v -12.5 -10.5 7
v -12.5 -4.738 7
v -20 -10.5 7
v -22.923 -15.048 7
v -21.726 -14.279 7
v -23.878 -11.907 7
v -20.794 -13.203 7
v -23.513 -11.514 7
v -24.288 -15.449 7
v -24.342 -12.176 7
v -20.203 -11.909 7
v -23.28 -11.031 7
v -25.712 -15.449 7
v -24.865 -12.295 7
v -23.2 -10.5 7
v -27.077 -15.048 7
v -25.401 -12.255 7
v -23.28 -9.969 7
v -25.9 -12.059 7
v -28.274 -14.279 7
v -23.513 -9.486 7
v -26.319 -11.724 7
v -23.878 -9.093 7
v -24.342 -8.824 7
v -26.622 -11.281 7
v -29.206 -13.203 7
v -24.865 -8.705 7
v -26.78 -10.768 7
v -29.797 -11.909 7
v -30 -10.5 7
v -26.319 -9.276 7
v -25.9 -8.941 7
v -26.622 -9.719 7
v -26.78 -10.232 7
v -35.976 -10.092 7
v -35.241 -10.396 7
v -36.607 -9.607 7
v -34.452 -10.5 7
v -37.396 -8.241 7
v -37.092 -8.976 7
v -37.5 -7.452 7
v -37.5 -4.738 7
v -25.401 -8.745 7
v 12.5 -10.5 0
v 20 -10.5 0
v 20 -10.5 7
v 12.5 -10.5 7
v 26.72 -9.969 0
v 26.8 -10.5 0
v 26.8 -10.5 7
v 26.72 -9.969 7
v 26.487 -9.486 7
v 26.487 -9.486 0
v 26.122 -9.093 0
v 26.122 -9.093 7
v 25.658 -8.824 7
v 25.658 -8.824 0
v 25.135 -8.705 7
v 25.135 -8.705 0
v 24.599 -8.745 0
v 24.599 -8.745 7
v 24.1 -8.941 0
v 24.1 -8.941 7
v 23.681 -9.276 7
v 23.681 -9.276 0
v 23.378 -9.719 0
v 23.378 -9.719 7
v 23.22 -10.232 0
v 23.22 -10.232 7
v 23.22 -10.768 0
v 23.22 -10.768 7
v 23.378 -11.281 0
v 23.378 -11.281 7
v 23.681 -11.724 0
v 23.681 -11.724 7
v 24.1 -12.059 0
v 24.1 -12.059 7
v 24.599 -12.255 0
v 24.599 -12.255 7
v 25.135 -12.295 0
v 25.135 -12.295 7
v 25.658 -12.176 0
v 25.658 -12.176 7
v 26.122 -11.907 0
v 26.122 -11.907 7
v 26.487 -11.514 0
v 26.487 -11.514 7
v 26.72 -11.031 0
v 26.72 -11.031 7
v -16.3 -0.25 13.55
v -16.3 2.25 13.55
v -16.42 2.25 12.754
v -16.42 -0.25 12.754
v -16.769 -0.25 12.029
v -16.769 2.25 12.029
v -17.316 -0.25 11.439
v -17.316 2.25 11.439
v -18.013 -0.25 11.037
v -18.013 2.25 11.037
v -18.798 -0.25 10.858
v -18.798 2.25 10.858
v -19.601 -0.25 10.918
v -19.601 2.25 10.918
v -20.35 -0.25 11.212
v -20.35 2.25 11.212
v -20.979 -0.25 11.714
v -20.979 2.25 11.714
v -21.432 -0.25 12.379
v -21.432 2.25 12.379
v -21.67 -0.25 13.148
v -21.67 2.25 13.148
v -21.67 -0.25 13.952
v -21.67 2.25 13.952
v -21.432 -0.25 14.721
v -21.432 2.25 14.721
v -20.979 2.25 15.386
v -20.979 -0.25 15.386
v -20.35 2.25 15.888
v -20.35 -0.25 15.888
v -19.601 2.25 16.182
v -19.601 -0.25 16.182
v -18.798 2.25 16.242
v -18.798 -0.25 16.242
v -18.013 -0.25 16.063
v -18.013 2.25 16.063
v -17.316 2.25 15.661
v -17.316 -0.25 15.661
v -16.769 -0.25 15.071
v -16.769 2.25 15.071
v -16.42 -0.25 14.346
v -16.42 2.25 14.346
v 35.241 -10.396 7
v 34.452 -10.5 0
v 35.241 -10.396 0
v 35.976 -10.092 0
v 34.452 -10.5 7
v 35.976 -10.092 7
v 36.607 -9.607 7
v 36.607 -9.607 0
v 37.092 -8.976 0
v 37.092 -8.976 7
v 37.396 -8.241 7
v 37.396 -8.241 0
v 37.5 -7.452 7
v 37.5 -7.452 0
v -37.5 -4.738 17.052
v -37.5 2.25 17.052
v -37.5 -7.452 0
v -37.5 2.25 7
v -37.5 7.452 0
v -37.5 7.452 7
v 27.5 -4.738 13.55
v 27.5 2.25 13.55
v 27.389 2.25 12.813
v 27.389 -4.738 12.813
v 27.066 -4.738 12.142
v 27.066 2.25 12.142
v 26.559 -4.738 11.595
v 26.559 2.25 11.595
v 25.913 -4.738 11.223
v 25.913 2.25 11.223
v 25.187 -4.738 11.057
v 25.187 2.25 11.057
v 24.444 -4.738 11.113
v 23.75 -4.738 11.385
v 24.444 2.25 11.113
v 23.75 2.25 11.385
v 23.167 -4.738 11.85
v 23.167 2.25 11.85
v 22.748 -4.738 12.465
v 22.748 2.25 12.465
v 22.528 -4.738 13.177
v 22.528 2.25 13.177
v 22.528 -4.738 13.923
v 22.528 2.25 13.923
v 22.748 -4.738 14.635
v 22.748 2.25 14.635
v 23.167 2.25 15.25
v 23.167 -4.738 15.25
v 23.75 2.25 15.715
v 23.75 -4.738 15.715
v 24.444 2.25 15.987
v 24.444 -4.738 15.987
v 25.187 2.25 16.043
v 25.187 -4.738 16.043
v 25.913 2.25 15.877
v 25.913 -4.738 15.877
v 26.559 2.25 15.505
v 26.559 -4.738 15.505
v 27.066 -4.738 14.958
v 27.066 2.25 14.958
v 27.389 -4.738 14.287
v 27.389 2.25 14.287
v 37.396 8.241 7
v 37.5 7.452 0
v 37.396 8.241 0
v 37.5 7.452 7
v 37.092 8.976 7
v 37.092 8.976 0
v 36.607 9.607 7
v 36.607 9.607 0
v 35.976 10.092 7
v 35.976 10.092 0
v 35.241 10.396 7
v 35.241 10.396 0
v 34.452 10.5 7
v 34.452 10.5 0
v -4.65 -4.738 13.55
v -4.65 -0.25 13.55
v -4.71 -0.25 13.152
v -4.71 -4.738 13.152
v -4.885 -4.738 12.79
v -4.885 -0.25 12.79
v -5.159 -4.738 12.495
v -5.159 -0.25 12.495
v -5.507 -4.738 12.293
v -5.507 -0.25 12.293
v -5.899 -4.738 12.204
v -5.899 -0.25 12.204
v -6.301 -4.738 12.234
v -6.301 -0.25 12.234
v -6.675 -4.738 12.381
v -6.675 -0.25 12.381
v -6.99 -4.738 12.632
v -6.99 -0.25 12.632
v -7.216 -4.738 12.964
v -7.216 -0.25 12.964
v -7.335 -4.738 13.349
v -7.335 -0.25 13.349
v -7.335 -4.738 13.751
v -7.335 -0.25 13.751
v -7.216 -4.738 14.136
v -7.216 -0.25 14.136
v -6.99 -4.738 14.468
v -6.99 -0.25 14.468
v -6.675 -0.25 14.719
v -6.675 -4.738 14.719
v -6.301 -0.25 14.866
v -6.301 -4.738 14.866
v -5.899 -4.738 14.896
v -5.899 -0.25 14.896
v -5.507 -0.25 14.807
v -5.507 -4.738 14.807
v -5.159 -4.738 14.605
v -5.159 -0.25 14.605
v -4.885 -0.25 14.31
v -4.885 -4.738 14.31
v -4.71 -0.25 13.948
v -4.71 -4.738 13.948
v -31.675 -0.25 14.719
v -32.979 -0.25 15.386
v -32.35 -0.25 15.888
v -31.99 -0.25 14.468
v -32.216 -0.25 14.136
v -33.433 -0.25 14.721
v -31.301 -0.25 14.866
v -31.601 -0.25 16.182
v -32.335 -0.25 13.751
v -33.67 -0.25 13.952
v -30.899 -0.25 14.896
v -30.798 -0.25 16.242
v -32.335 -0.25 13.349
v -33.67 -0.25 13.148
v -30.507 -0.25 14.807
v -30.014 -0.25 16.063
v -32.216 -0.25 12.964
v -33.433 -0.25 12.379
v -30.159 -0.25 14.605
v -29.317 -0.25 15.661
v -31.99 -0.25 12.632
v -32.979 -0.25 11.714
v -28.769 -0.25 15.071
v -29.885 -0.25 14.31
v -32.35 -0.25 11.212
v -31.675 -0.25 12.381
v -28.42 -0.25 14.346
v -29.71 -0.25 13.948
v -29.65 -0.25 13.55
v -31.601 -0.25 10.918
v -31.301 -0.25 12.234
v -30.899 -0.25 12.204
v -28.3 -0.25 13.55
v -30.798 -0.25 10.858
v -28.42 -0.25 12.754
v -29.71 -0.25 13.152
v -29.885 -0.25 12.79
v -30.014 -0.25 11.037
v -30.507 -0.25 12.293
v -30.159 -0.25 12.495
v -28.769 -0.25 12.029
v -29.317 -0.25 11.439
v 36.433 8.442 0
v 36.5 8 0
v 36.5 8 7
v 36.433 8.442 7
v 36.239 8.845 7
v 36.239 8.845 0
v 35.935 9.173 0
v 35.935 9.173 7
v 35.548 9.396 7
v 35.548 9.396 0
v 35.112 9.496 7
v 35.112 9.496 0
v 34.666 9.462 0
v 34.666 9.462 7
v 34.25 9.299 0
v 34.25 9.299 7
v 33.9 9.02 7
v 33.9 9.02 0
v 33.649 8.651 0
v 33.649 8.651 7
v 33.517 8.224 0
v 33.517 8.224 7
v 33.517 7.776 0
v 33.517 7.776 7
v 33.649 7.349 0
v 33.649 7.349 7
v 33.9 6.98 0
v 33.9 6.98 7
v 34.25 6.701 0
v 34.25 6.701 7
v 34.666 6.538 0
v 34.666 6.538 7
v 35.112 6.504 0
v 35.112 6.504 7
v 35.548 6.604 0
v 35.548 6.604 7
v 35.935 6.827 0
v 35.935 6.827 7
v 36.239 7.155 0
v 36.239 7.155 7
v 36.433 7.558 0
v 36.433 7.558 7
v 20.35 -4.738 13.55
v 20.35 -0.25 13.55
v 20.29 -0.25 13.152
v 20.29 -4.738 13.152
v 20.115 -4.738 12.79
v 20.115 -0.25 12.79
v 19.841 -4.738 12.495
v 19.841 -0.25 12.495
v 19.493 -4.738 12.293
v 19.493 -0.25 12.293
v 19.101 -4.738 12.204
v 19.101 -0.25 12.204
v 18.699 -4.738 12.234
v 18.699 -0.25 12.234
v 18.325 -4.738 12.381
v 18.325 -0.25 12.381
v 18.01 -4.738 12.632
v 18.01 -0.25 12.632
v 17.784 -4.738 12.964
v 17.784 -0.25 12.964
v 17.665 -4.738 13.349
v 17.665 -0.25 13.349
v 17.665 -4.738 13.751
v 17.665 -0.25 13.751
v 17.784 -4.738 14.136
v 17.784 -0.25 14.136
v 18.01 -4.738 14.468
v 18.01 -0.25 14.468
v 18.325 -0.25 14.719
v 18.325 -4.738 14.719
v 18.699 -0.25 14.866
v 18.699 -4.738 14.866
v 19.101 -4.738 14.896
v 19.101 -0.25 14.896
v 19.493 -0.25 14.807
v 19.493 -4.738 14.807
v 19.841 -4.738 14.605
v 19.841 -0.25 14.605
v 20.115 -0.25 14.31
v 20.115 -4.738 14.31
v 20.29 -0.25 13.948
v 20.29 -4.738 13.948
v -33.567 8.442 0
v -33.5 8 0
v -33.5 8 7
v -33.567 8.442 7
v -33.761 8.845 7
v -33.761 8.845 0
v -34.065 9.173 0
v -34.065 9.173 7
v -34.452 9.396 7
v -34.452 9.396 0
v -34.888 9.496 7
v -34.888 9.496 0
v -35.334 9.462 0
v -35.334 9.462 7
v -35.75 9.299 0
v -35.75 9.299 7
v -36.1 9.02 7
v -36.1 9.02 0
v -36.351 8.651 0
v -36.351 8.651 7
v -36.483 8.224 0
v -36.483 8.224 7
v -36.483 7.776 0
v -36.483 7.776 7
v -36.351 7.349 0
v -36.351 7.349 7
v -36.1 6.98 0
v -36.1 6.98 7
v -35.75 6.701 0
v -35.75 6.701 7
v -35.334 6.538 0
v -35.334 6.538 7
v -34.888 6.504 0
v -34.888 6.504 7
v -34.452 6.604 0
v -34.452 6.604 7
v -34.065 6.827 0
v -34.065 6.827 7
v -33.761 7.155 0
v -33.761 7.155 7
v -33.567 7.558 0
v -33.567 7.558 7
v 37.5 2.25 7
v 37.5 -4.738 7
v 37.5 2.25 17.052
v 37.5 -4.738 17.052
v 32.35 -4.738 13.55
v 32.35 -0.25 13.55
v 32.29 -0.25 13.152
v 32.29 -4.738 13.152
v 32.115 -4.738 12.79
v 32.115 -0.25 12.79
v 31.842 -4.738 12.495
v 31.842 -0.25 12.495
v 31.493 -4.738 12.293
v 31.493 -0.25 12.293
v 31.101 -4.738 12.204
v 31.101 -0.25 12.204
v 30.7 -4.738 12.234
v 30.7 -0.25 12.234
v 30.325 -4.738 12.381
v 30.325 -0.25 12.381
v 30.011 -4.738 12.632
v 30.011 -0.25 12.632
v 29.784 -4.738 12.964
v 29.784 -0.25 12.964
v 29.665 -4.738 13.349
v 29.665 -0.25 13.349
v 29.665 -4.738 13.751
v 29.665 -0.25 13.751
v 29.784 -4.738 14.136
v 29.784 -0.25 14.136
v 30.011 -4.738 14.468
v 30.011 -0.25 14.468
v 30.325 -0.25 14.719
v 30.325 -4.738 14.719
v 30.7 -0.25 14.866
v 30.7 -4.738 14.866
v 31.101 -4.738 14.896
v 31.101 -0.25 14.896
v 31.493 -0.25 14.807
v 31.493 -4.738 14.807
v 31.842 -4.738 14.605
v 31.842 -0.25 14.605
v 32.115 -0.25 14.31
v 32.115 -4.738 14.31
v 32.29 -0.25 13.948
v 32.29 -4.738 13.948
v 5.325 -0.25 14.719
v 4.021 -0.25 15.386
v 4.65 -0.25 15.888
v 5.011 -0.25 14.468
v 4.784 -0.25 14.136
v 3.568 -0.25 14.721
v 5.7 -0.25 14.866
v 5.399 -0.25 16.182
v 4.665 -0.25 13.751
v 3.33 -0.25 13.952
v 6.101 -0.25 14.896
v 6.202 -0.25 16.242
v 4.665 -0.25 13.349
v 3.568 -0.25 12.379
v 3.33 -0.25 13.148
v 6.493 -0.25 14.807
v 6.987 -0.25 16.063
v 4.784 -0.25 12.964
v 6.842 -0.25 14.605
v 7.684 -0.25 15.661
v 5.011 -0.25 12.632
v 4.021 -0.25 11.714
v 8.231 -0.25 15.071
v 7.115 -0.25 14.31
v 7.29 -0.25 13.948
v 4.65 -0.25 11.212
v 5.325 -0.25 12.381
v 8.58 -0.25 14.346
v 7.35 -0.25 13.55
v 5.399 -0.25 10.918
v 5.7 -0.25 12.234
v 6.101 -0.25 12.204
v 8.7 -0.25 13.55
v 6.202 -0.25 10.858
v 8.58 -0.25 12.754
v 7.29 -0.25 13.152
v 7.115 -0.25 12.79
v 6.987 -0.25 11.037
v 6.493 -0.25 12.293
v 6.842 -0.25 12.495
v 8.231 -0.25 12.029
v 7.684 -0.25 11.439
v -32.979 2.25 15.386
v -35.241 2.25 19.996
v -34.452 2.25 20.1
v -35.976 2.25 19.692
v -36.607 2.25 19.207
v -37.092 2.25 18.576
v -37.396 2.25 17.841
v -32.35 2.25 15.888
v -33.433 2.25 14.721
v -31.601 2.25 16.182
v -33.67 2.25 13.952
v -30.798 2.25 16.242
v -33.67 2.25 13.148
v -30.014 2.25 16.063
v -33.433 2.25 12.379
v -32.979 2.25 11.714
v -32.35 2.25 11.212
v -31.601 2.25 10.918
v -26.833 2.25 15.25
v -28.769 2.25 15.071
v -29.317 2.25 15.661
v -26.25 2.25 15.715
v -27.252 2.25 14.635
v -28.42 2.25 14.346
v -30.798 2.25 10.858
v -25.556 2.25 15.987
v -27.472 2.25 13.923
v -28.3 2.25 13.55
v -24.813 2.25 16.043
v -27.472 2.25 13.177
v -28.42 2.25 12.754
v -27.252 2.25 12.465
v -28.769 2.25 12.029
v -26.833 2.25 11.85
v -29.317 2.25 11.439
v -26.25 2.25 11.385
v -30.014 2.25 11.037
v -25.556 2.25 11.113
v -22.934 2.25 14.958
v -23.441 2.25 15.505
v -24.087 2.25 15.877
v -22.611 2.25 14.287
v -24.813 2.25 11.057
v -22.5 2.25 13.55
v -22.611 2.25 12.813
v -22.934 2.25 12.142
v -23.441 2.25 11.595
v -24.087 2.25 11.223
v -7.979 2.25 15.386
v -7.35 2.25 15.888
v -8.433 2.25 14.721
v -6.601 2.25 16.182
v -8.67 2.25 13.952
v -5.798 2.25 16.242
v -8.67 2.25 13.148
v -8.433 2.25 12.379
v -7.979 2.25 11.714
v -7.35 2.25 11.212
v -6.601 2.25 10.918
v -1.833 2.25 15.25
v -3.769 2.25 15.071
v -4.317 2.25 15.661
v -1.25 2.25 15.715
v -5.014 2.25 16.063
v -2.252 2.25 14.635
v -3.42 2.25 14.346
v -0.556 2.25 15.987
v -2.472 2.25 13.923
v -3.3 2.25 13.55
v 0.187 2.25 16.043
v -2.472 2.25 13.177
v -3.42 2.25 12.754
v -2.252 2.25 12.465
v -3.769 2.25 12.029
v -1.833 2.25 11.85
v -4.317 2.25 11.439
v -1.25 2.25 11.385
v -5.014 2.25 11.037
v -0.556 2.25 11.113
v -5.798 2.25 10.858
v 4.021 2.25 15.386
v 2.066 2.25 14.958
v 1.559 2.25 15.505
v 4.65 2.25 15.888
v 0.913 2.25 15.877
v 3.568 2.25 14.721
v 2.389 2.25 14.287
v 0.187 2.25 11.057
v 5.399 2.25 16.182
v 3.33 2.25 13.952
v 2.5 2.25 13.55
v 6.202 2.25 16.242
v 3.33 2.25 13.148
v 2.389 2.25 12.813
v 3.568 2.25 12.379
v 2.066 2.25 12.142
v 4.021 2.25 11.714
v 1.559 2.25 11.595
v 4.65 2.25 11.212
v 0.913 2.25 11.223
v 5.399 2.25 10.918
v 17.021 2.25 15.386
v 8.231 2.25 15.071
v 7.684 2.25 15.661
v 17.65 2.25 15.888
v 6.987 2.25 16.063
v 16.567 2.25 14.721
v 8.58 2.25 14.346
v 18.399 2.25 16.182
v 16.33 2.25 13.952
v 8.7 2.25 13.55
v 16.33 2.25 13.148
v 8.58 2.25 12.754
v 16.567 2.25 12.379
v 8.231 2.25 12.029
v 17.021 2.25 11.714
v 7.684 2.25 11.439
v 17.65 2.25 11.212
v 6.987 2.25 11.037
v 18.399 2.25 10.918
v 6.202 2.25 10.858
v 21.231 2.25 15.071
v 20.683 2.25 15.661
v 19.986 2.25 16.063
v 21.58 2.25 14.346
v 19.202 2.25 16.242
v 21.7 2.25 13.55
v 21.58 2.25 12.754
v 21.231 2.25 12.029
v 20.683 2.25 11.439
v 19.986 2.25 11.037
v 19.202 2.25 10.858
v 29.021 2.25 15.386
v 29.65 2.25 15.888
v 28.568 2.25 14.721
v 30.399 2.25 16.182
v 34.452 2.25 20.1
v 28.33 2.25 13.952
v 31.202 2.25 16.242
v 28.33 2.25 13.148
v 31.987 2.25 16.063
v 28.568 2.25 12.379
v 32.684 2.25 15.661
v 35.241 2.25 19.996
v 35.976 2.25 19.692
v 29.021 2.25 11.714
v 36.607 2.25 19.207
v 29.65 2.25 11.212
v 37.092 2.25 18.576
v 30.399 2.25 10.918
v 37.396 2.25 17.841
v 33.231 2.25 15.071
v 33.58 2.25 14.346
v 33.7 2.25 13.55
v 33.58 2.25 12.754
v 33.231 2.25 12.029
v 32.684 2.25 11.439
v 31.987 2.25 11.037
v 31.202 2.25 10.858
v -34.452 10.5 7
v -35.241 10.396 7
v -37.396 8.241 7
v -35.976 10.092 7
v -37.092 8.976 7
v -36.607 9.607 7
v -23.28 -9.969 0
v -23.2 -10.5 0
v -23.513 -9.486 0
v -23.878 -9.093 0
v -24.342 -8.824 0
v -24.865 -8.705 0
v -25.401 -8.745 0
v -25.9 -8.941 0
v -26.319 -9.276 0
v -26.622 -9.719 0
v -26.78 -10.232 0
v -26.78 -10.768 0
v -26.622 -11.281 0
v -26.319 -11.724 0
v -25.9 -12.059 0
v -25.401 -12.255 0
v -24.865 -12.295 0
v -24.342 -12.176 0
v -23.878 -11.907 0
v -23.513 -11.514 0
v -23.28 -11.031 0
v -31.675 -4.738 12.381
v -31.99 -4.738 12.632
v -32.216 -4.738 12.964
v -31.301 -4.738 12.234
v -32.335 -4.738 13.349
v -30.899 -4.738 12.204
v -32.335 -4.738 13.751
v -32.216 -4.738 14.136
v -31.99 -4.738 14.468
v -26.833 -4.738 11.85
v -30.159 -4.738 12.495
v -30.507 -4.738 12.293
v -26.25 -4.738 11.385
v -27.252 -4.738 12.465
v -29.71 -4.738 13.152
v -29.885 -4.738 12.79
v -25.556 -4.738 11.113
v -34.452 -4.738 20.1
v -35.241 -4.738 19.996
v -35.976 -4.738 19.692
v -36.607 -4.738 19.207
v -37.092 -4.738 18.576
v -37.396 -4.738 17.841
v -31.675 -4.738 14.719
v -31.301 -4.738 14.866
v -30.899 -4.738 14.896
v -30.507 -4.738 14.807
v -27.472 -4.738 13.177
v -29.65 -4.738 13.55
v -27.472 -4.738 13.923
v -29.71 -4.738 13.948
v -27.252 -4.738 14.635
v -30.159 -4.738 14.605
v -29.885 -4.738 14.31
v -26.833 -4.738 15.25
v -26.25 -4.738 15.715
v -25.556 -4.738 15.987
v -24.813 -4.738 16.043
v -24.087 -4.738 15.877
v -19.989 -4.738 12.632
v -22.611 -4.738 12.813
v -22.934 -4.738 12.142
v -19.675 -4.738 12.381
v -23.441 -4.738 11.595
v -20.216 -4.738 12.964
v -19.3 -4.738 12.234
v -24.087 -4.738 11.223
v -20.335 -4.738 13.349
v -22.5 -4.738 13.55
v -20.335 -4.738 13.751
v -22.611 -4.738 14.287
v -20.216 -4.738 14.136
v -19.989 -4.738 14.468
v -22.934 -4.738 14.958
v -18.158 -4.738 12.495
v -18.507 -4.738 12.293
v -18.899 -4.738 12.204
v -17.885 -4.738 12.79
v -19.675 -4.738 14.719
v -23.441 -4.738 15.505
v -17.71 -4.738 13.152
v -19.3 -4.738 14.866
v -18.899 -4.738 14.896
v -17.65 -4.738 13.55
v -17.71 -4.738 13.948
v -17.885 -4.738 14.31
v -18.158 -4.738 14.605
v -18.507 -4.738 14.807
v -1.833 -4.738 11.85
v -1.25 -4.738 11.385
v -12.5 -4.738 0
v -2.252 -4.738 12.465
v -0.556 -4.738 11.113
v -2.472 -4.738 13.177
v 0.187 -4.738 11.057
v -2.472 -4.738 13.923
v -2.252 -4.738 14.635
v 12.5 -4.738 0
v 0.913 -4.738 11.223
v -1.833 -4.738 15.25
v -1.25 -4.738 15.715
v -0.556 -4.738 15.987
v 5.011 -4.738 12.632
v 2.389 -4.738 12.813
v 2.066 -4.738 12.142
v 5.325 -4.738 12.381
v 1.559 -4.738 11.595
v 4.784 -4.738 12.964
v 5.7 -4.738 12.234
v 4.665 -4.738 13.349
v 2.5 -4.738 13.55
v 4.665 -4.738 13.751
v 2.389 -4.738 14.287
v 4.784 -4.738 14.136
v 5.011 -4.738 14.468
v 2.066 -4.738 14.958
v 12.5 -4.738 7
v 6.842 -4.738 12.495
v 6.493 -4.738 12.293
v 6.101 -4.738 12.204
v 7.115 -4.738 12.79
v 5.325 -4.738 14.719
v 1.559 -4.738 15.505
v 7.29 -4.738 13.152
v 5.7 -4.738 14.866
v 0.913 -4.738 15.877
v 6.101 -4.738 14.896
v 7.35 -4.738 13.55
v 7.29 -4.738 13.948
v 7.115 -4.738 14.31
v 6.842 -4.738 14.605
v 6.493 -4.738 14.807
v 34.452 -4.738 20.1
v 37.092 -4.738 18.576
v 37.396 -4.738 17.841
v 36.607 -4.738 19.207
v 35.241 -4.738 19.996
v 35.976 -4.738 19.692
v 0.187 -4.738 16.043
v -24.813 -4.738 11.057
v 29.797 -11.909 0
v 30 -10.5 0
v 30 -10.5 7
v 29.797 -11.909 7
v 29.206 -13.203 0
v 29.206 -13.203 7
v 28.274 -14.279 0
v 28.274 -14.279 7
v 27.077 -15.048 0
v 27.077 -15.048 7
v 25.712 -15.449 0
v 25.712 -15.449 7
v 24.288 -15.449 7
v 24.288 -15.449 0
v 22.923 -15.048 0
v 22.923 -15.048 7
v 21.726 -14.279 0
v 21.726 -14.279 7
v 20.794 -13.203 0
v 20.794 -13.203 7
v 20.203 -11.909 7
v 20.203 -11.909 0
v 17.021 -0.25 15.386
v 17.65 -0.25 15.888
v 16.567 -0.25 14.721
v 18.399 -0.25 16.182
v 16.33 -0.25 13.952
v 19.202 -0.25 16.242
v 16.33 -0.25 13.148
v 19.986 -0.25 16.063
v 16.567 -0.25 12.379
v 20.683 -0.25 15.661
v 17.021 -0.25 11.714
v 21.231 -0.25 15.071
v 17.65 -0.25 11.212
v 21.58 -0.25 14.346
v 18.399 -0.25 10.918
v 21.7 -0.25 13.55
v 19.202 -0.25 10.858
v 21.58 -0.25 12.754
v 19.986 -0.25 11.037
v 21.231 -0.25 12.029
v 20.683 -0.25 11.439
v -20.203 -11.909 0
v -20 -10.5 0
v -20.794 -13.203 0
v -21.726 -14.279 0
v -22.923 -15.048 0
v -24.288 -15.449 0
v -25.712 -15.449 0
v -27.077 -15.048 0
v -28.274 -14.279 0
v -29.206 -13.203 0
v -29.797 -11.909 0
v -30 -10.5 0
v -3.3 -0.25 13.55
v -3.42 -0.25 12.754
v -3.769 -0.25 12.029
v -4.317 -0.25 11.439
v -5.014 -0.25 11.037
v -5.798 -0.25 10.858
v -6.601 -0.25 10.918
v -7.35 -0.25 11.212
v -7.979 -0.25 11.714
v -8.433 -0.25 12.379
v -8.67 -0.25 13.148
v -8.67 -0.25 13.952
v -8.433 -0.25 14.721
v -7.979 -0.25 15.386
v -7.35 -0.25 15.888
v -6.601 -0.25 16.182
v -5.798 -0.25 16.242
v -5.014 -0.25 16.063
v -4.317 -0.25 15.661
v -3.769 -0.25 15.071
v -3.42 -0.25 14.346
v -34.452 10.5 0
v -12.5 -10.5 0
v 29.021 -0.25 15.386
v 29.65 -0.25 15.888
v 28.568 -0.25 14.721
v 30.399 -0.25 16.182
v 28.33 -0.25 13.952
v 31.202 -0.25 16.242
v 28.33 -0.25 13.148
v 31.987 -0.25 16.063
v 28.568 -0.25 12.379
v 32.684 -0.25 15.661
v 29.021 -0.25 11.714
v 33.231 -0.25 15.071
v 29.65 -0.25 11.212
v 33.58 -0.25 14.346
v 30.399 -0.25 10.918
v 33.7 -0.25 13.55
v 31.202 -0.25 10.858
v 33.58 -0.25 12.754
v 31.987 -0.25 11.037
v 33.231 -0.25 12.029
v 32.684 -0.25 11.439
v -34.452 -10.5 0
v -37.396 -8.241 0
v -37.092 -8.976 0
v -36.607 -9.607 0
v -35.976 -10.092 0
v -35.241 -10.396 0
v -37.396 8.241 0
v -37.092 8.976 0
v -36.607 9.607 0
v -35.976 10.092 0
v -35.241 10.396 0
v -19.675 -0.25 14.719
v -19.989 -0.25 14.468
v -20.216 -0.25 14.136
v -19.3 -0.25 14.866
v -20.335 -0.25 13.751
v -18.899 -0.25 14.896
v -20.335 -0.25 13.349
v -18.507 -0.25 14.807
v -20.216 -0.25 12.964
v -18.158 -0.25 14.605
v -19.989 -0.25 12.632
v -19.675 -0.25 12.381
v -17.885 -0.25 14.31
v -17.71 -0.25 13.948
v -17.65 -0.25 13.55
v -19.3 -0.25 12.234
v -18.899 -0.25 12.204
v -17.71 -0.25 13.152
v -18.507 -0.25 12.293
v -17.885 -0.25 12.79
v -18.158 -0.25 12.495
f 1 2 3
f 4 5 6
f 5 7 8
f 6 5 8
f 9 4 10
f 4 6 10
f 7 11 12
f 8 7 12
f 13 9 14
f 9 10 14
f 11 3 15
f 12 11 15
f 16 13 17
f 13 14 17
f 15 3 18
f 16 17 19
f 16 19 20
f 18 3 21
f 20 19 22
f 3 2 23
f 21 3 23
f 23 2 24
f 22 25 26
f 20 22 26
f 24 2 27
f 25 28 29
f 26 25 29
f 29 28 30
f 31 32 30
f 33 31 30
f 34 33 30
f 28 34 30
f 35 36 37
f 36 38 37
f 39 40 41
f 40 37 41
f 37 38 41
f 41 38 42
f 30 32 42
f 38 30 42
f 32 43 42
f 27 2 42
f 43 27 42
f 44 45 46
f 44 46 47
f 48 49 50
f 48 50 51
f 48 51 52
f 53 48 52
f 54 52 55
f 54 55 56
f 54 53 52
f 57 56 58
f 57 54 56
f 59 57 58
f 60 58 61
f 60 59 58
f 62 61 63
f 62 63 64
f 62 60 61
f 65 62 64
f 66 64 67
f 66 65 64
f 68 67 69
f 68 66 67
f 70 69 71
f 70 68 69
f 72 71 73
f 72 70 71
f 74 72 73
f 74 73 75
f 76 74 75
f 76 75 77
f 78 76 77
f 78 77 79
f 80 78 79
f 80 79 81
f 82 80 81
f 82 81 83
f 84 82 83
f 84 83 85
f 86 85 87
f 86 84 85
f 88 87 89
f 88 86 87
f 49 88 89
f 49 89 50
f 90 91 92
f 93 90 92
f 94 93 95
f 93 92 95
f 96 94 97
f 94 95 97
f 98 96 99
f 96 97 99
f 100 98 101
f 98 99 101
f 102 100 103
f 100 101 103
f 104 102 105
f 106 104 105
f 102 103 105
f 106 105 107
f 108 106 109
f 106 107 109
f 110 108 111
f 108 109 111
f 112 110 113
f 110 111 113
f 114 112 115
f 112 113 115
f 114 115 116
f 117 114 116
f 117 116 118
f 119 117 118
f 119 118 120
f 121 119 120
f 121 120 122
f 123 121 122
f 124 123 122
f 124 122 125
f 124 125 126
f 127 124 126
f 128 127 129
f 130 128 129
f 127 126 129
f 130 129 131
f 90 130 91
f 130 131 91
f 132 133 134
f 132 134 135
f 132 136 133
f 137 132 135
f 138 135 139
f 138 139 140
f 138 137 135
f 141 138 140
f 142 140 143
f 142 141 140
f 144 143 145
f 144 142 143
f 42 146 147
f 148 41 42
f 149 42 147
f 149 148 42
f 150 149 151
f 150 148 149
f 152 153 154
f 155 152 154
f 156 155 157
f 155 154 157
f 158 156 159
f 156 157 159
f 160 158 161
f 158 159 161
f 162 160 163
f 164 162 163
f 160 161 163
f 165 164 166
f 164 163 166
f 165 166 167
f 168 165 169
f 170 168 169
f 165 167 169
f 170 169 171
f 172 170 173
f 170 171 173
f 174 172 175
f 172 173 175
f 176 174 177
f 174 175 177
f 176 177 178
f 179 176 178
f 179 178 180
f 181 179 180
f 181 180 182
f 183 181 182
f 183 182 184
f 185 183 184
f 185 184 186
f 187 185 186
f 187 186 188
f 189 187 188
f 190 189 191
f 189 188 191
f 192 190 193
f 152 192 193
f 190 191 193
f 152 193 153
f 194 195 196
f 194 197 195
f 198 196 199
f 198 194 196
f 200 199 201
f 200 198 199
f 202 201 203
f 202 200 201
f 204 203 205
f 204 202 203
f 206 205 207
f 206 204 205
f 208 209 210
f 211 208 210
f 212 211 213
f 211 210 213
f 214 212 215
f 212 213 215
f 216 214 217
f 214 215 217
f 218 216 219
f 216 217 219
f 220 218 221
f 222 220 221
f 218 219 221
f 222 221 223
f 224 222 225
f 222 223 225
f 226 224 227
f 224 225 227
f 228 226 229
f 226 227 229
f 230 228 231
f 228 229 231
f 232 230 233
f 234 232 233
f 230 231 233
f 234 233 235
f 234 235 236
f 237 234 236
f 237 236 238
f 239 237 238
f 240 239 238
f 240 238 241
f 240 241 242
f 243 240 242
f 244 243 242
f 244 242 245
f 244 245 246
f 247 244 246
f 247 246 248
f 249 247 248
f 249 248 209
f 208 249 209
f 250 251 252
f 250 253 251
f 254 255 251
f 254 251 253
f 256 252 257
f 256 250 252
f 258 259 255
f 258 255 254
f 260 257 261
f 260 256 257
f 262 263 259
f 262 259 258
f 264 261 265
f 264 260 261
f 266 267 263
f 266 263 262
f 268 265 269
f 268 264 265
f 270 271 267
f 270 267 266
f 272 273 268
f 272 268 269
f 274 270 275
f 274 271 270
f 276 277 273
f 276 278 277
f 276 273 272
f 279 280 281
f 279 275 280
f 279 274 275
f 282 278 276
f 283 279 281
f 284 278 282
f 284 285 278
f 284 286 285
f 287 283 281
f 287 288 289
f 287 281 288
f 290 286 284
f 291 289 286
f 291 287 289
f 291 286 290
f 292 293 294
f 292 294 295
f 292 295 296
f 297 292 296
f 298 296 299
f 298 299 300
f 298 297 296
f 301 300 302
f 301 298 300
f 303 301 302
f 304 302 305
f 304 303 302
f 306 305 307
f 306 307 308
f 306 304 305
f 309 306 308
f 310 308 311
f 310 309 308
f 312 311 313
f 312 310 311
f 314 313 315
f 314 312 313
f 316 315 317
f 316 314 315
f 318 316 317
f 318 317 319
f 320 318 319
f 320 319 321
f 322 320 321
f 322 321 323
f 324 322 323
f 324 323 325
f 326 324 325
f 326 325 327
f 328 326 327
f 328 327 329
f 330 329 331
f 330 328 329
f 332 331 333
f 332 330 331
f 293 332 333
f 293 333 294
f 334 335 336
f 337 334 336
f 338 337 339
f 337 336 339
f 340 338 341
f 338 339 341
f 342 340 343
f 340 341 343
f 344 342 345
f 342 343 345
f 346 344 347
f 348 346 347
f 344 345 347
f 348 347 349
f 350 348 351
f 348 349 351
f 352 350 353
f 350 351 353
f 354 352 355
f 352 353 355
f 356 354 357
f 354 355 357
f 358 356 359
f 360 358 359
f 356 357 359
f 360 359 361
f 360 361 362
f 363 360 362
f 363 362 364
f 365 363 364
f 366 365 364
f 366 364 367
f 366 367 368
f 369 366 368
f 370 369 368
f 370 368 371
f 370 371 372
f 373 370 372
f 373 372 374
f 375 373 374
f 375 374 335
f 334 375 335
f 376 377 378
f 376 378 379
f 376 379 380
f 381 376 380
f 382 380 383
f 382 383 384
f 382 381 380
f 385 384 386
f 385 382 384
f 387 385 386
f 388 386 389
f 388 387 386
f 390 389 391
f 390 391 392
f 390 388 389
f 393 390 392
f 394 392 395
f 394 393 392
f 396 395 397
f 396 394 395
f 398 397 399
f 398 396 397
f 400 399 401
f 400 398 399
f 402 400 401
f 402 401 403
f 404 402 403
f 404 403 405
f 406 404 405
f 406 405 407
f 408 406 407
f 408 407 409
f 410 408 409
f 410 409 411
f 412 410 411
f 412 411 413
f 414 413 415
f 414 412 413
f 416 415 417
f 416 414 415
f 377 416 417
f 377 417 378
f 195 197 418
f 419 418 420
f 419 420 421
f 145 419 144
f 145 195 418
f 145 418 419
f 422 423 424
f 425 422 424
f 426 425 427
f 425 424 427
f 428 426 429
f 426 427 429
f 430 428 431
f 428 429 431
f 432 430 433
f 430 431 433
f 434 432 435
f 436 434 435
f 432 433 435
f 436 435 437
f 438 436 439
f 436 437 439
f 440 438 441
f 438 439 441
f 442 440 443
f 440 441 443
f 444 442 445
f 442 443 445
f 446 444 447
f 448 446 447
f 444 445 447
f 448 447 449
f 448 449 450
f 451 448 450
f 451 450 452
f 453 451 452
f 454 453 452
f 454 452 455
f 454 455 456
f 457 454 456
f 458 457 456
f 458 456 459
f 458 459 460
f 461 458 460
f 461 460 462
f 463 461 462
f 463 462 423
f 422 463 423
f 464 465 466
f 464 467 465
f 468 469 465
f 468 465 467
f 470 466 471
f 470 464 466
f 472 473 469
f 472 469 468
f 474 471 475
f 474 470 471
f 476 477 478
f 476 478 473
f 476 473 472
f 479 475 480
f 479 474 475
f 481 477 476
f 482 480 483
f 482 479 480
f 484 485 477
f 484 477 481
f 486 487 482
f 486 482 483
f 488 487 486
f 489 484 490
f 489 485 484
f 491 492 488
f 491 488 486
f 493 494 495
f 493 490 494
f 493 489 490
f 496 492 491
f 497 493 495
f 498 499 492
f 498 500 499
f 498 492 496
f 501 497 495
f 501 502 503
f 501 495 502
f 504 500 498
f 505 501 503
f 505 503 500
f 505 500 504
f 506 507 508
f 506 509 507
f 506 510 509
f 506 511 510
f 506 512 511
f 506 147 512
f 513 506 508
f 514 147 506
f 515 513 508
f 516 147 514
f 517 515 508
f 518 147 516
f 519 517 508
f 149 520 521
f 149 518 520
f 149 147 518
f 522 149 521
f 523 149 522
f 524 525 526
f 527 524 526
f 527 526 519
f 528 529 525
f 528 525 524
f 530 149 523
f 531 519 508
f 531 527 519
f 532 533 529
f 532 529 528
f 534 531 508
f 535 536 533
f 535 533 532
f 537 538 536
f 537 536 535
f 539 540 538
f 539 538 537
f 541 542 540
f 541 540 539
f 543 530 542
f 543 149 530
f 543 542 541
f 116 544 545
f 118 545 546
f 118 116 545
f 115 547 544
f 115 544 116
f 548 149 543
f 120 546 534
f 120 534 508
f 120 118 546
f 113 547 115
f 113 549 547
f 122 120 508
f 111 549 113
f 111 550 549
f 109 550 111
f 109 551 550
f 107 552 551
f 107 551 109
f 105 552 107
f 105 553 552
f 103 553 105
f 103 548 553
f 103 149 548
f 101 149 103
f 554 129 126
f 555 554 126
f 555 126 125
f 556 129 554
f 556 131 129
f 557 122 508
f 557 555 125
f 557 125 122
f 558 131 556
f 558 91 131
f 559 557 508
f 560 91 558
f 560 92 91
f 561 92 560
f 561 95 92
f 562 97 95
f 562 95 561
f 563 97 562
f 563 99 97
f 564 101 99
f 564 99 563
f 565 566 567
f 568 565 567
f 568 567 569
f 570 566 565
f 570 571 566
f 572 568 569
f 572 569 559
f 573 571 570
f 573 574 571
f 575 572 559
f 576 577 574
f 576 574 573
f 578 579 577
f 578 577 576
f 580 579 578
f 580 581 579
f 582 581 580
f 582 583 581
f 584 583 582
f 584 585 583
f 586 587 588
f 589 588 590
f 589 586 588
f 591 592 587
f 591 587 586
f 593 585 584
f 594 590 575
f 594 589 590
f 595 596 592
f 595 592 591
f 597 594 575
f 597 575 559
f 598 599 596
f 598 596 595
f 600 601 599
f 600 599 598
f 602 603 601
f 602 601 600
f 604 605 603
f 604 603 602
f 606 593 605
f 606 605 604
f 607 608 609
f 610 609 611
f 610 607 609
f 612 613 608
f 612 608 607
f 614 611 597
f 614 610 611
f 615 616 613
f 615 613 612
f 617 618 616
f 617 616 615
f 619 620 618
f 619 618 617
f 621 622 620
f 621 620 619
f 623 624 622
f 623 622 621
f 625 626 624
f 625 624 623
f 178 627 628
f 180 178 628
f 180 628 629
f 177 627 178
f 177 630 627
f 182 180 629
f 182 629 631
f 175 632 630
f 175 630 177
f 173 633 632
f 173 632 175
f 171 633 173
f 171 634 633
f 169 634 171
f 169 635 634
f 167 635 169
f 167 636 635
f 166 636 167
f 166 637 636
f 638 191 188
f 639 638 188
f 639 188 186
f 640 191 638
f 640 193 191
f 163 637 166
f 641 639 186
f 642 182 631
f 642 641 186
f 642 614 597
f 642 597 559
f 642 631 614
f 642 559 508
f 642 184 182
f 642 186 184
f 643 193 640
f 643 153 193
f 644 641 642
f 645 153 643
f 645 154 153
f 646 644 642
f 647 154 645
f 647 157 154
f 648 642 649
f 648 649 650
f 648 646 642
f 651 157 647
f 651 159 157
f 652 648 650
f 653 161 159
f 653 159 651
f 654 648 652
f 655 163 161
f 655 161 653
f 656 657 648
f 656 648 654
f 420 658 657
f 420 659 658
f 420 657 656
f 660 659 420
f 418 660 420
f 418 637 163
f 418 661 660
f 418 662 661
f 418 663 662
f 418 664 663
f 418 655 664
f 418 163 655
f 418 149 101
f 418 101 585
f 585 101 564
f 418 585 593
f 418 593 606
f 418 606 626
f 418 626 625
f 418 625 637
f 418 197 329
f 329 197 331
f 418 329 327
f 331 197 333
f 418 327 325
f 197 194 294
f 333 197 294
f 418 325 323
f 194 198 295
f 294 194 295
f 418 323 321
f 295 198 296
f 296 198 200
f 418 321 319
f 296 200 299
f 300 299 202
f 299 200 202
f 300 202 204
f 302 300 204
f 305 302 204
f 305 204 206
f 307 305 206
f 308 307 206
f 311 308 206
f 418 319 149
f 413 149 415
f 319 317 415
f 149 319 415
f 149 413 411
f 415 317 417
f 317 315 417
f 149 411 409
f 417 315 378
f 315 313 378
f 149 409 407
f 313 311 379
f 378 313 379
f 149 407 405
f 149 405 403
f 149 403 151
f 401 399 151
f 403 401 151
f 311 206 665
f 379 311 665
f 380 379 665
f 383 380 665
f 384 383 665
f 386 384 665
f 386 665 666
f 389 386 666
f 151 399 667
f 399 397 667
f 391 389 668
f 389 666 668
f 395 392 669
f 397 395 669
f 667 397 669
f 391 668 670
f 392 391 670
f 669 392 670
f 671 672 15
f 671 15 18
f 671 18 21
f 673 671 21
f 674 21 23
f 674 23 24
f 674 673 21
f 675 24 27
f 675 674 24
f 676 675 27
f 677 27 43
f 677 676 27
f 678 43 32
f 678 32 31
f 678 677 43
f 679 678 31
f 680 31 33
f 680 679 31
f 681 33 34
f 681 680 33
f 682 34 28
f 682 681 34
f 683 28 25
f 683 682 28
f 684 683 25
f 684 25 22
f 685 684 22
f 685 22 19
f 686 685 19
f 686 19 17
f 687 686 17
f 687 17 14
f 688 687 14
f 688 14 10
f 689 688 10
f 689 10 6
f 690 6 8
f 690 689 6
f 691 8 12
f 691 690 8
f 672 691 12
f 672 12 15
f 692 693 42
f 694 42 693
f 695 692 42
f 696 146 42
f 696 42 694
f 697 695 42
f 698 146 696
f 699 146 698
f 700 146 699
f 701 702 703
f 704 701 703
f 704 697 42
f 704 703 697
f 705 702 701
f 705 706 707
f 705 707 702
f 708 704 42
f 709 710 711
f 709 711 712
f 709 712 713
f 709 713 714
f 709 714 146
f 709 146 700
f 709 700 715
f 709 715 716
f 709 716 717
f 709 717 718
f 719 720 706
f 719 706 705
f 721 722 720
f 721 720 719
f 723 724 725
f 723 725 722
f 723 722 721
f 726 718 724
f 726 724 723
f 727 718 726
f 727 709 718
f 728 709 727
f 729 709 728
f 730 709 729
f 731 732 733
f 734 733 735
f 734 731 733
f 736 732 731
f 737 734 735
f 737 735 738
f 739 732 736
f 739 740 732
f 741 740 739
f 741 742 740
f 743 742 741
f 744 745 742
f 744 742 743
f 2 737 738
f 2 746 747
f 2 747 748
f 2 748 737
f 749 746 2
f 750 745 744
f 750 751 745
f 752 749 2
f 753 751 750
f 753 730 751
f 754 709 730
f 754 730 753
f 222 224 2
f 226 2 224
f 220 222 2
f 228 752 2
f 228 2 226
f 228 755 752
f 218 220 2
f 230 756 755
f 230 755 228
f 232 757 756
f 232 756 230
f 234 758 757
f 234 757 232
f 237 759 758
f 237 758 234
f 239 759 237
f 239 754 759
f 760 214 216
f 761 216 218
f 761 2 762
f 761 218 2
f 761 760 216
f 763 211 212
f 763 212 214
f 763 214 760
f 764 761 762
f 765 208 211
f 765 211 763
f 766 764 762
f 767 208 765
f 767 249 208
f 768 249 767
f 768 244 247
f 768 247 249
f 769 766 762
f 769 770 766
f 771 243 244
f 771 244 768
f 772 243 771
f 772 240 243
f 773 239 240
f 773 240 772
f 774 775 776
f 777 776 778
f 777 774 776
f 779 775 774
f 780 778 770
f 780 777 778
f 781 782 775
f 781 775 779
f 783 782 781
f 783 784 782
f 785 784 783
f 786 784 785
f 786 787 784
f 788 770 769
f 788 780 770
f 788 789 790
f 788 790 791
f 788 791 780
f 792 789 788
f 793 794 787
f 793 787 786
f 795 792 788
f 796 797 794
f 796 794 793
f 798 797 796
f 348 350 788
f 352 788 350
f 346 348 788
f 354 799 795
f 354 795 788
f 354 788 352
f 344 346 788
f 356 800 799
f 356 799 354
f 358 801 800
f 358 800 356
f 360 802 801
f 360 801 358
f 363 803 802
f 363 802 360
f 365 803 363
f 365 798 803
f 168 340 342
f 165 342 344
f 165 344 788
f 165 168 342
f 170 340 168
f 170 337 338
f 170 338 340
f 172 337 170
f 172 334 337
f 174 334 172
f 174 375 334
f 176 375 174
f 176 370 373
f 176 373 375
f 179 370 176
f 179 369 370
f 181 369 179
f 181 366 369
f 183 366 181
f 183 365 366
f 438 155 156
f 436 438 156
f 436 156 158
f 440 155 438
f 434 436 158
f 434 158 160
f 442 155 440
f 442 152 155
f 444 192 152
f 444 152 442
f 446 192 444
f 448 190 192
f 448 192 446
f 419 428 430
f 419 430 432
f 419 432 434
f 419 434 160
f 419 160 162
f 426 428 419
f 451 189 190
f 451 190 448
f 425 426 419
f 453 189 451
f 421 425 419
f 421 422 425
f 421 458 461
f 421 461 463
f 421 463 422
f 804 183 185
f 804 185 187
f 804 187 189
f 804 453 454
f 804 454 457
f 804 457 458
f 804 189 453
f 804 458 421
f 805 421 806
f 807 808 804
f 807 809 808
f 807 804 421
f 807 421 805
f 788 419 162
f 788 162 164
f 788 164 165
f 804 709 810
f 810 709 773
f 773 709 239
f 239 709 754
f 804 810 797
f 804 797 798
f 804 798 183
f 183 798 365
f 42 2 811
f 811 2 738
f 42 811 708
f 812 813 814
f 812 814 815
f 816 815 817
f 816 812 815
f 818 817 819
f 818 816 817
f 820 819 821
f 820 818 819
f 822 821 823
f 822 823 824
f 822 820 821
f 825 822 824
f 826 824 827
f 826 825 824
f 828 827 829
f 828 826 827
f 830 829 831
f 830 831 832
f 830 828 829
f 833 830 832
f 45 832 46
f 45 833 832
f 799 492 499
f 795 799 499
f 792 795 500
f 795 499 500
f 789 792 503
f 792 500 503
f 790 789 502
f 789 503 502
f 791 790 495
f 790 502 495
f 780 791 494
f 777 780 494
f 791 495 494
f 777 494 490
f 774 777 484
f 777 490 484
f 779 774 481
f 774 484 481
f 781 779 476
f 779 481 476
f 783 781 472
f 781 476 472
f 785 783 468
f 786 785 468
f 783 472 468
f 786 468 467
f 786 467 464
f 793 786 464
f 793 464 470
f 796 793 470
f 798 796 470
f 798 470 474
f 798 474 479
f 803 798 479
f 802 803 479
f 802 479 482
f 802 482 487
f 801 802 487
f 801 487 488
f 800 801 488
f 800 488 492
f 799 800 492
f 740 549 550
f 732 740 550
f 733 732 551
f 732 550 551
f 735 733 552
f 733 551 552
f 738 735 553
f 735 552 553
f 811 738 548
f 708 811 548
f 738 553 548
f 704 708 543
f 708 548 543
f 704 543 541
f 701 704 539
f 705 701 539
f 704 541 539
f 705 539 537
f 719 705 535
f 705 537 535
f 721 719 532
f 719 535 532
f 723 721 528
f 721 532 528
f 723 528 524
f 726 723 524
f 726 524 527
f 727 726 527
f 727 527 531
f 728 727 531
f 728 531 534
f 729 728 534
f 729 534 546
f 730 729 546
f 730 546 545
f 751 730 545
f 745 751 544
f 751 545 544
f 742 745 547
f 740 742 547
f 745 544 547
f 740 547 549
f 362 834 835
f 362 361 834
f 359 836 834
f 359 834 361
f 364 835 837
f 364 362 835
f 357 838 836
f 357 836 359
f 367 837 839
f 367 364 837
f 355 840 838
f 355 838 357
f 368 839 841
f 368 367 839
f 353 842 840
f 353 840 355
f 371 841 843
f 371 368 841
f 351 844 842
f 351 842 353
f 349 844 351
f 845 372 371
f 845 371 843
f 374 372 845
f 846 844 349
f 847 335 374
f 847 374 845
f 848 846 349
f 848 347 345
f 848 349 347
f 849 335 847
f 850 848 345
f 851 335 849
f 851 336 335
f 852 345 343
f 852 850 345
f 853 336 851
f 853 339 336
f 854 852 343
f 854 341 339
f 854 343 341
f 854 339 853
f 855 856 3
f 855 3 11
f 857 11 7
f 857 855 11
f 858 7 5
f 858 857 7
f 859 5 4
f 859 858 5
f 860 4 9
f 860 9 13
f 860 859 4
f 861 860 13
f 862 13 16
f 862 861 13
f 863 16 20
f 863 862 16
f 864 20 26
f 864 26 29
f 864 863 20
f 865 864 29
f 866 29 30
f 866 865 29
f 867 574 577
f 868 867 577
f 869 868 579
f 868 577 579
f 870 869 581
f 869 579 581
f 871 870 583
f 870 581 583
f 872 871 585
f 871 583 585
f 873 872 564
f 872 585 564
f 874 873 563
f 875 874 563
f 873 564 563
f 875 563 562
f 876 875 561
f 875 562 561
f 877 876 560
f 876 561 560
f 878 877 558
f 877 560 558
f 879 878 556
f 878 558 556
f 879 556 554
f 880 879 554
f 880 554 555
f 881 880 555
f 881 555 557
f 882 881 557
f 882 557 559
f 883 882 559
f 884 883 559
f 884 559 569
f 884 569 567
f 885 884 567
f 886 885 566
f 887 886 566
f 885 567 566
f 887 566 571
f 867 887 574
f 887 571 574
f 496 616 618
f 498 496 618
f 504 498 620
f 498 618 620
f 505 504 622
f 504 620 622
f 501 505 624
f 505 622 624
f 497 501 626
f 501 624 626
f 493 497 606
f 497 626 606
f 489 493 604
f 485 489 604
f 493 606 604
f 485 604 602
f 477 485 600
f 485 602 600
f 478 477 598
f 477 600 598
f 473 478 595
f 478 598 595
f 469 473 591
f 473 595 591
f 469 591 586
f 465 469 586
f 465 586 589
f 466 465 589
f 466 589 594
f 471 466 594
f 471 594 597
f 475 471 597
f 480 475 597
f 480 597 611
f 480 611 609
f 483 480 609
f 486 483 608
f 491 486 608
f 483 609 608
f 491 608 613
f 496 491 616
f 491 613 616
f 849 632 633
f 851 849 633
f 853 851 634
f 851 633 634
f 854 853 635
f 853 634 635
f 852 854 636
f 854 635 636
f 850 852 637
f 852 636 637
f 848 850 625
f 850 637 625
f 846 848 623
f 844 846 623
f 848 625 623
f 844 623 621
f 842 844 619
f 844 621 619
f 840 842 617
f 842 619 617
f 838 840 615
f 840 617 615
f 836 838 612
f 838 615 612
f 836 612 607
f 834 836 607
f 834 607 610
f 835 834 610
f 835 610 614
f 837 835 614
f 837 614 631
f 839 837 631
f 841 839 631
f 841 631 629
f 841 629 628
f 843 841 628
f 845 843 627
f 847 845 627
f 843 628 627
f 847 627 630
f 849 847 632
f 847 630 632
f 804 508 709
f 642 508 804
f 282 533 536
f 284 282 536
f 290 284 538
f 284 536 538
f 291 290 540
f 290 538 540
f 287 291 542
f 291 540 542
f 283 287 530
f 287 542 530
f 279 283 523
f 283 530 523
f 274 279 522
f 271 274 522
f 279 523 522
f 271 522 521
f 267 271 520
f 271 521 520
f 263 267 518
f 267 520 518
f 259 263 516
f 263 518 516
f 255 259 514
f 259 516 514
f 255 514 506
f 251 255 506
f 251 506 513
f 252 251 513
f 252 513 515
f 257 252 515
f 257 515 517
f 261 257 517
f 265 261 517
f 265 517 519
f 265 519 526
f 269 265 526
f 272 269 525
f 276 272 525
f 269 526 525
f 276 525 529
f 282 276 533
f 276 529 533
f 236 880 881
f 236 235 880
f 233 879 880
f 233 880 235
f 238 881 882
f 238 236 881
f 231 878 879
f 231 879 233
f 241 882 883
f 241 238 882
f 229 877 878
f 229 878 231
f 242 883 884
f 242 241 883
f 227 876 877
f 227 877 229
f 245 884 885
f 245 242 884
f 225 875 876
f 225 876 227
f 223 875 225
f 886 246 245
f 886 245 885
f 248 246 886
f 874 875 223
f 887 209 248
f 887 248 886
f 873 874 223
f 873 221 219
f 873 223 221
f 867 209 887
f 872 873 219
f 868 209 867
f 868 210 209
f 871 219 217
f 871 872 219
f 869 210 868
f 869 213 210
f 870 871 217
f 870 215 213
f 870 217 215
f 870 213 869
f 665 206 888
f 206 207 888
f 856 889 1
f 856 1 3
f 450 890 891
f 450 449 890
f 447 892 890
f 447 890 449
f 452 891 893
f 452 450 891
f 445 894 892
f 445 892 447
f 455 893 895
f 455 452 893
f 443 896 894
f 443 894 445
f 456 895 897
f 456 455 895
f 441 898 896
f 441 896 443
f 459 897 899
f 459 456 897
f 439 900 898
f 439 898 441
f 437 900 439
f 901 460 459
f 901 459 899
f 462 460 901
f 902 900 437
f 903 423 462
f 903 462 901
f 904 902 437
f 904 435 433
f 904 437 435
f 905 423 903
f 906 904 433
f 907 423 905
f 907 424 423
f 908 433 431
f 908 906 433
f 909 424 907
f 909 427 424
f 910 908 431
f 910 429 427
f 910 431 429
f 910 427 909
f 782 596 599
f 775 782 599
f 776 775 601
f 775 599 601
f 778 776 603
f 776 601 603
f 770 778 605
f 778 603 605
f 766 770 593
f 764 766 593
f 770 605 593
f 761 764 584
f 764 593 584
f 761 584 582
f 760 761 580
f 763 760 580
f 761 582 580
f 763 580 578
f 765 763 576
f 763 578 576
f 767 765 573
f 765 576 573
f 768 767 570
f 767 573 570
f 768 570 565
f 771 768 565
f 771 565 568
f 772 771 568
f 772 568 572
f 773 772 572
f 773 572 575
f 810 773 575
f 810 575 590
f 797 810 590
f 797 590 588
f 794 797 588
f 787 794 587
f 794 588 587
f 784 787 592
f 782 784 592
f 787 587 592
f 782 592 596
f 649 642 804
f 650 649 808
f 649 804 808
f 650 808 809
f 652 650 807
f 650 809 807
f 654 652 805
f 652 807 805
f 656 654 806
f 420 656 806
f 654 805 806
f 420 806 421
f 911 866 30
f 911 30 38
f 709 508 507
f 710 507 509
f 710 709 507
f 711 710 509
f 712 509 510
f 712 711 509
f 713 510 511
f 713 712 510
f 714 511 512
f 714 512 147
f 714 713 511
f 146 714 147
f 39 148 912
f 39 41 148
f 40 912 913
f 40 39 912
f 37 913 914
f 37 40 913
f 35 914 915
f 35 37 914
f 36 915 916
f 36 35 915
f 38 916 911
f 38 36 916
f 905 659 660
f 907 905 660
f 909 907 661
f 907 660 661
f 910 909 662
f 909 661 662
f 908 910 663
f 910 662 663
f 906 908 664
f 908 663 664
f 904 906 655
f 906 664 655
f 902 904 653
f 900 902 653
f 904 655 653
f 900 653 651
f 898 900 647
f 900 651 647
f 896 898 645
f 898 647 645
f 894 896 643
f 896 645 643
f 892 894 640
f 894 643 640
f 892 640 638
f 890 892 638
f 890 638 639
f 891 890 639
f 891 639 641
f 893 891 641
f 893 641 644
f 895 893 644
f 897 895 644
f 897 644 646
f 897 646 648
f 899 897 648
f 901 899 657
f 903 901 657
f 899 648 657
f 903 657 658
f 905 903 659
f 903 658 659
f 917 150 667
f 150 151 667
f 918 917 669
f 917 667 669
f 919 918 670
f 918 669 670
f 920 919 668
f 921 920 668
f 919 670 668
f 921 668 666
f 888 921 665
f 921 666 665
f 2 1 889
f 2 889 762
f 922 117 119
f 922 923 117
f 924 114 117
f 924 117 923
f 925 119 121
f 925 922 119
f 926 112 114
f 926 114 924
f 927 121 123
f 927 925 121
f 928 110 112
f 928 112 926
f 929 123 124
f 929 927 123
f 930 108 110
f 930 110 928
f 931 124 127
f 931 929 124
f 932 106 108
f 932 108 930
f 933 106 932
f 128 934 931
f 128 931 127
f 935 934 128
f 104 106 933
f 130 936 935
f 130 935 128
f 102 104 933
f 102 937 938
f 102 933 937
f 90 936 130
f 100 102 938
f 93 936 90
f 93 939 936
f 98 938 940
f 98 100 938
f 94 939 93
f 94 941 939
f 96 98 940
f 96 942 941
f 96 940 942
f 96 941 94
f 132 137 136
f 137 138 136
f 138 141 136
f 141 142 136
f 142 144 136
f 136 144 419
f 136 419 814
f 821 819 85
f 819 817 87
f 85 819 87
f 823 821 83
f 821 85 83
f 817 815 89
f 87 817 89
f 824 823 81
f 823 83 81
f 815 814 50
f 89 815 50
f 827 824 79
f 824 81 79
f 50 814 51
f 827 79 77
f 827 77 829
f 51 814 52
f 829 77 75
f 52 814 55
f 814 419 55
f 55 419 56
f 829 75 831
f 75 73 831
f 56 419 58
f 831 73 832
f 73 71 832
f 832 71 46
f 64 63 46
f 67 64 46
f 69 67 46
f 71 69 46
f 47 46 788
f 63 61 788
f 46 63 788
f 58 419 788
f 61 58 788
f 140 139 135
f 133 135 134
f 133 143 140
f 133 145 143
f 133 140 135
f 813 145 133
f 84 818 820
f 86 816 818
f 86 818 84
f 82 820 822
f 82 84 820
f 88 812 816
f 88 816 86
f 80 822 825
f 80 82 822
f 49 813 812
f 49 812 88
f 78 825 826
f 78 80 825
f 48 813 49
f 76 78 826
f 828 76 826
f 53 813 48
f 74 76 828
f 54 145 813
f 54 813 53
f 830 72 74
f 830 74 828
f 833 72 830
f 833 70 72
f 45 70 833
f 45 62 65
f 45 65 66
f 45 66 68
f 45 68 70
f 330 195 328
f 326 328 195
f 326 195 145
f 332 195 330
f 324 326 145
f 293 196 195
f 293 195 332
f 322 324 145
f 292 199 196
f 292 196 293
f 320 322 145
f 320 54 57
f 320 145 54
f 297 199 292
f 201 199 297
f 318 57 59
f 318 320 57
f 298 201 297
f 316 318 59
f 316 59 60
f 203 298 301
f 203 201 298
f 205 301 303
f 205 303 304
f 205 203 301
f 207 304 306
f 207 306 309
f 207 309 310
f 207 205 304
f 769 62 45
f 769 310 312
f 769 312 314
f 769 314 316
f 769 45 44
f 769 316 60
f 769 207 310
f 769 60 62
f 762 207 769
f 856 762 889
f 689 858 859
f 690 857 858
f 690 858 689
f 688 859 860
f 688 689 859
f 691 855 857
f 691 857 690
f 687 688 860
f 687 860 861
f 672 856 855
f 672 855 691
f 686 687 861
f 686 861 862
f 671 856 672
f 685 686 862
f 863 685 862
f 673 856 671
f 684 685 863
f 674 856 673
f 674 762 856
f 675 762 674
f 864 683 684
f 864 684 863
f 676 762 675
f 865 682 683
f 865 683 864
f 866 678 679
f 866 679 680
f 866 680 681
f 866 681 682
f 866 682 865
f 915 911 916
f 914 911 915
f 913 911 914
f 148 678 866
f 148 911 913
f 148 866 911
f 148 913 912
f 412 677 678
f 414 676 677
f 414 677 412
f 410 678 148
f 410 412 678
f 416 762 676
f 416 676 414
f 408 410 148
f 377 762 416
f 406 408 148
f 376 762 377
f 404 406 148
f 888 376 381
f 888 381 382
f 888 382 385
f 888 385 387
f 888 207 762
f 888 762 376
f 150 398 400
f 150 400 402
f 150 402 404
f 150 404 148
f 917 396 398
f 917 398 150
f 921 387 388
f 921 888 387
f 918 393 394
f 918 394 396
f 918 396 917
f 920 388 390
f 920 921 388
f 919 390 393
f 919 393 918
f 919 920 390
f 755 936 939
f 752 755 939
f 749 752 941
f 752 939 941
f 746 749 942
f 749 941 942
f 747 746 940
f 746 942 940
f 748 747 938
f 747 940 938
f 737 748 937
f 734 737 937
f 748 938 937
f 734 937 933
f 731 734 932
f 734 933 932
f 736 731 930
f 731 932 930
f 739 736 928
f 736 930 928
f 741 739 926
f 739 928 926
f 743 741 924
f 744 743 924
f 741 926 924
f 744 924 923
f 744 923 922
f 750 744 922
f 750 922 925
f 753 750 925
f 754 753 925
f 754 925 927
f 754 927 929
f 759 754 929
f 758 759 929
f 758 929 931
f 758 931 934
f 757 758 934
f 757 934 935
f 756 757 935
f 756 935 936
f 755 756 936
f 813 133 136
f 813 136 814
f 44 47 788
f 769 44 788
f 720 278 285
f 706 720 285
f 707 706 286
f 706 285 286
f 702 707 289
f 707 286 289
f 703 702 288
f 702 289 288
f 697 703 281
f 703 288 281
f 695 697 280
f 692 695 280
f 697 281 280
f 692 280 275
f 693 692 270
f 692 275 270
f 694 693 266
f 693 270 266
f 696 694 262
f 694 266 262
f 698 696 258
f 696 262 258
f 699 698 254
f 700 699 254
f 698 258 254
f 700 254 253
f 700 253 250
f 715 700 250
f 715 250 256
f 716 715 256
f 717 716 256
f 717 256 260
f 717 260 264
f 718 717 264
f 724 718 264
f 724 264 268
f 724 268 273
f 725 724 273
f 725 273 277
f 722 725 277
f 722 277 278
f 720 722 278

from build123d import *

# Parameters (mm, degrees)
SKETCH1_R           = 1.79994
SKETCH1_R_2         = 1.5
BOSS_EXTRUDE1_DEPTH = 7
SKETCH2_W           = 75
SKETCH2_H           = 13.099999962
SKETCH2_R           = 2.6999438
SKETCH2_R_2         = 2.499995
SKETCH2_R_3         = 1.3498449
BOSS_EXTRUDE2_DEPTH = 6.987999994
SKETCH2_3_R         = 2.6999438
SKETCH2_3_R_2       = 1.3498449
CUT_EXTRUDE1_DEPTH  = 2.5
SKETCH7_W           = 45.754771374
SKETCH7_H           = 7.378762064
SKETCH7_W_2         = 5.75825354
SKETCH7_H_2         = 4.98011117
BOSS_EXTRUDE4_DEPTH = 7
SKETCH8_W           = 15.938133918
SKETCH8_H           = 10.613167284
CUT_EXTRUDE3_DEPTH  = 21.288
FILLET3_R           = 3.048
SKETCH4_W           = 25
SKETCH4_H           = 15.064836289
CUT_EXTRUDE2_DEPTH  = 38.822


with BuildPart() as part:
    # Sketch1 → Boss-Extrude1 (new body)
    with BuildSketch(Plane.XY):
        with BuildLine():
            Line((37.5, -10.5), (30, -10.5))
            ThreePointArc((30, -10.5), (25, -15.5), (20, -10.5))
            Line((20, -10.5), (5, -10.5))
            ThreePointArc((5, -10.5), (0, -15.5), (-5, -10.5))
            Line((-5, -10.5), (-20, -10.5))
            ThreePointArc((-20, -10.5), (-25, -15.5), (-30, -10.5))
            Line((-30, -10.5), (-37.5, -10.5))
            Line((-37.5, -10.5), (-37.5, 10.5))
            Line((-37.5, 10.5), (37.5, 10.5))
            Line((37.5, 10.5), (37.5, -10.5))
        make_face()
        with Locations((-25, -10.5)):
            Circle(SKETCH1_R, mode=Mode.SUBTRACT)
        with Locations((0, -10.5)):
            Circle(SKETCH1_R, mode=Mode.SUBTRACT)
        with Locations((25, -10.5)):
            Circle(SKETCH1_R, mode=Mode.SUBTRACT)
        with Locations((-35, 8)):
            Circle(SKETCH1_R_2, mode=Mode.SUBTRACT)
        with Locations((-15, 8)):
            Circle(SKETCH1_R_2, mode=Mode.SUBTRACT)
        with Locations((-10, 8)):
            Circle(SKETCH1_R_2, mode=Mode.SUBTRACT)
        with Locations((10, 8)):
            Circle(SKETCH1_R_2, mode=Mode.SUBTRACT)
        with Locations((35, 8)):
            Circle(SKETCH1_R_2, mode=Mode.SUBTRACT)
        with Locations((15, 8)):
            Circle(SKETCH1_R_2, mode=Mode.SUBTRACT)
    extrude(amount=BOSS_EXTRUDE1_DEPTH)

    # Sketch2 → Boss-Extrude2 (add)
    with BuildSketch(Plane(origin=(0, 2.24999999, 0), x_dir=(1, 0, 0), z_dir=(0, 1, 0))):
        with Locations((0, -13.549999981)):
            Rectangle(SKETCH2_W, SKETCH2_H)
        with Locations((31.0001404, -13.549999981)):
            Circle(SKETCH2_R, mode=Mode.SUBTRACT)
        with Locations((-31.0001404, -13.549999981)):
            Circle(SKETCH2_R, mode=Mode.SUBTRACT)
        with Locations((-25, -13.549999981)):
            Circle(SKETCH2_R_2, mode=Mode.SUBTRACT)
        with Locations((-6.0001404, -13.549999981)):
            Circle(SKETCH2_R, mode=Mode.SUBTRACT)
        with Locations((6.0001404, -13.549999981)):
            Circle(SKETCH2_R, mode=Mode.SUBTRACT)
        with Locations((0, -13.549999981)):
            Circle(SKETCH2_R_2, mode=Mode.SUBTRACT)
        with Locations((-18.9998596, -13.549999981)):
            Circle(SKETCH2_R, mode=Mode.SUBTRACT)
        with Locations((25, -13.549999981)):
            Circle(SKETCH2_R_2, mode=Mode.SUBTRACT)
        with Locations((18.9998596, -13.549999981)):
            Circle(SKETCH2_R, mode=Mode.SUBTRACT)
        with Locations((-31.0001404, -13.549999981)):
            Circle(SKETCH2_R)
        with Locations((-31.0001404, -13.549999981)):
            Circle(SKETCH2_R_3, mode=Mode.SUBTRACT)
        with Locations((-18.9998596, -13.549999981)):
            Circle(SKETCH2_R)
        with Locations((-18.9998596, -13.549999981)):
            Circle(SKETCH2_R_3, mode=Mode.SUBTRACT)
        with Locations((-6.0001404, -13.549999981)):
            Circle(SKETCH2_R)
        with Locations((-6.0001404, -13.549999981)):
            Circle(SKETCH2_R_3, mode=Mode.SUBTRACT)
        with Locations((6.0001404, -13.549999981)):
            Circle(SKETCH2_R)
        with Locations((6.0001404, -13.549999981)):
            Circle(SKETCH2_R_3, mode=Mode.SUBTRACT)
        with Locations((18.9998596, -13.549999981)):
            Circle(SKETCH2_R)
        with Locations((18.9998596, -13.549999981)):
            Circle(SKETCH2_R_3, mode=Mode.SUBTRACT)
        with Locations((31.0001404, -13.549999981)):
            Circle(SKETCH2_R)
        with Locations((31.0001404, -13.549999981)):
            Circle(SKETCH2_R_3, mode=Mode.SUBTRACT)
    extrude(amount=-BOSS_EXTRUDE2_DEPTH)

    # Sketch2<3> → Cut-Extrude1 (cut)
    with BuildSketch(Plane(origin=(0, 2.24999999, 0), x_dir=(1, 0, 0), z_dir=(0, 1, 0))):
        with Locations((-31.0001404, -13.549999981)):
            Circle(SKETCH2_3_R)
        with Locations((-31.0001404, -13.549999981)):
            Circle(SKETCH2_3_R_2, mode=Mode.SUBTRACT)
        with Locations((-18.9998596, -13.549999981)):
            Circle(SKETCH2_3_R)
        with Locations((-18.9998596, -13.549999981)):
            Circle(SKETCH2_3_R_2, mode=Mode.SUBTRACT)
        with Locations((-6.0001404, -13.549999981)):
            Circle(SKETCH2_3_R)
        with Locations((-6.0001404, -13.549999981)):
            Circle(SKETCH2_3_R_2, mode=Mode.SUBTRACT)
        with Locations((6.0001404, -13.549999981)):
            Circle(SKETCH2_3_R)
        with Locations((6.0001404, -13.549999981)):
            Circle(SKETCH2_3_R_2, mode=Mode.SUBTRACT)
        with Locations((18.9998596, -13.549999981)):
            Circle(SKETCH2_3_R)
        with Locations((18.9998596, -13.549999981)):
            Circle(SKETCH2_3_R_2, mode=Mode.SUBTRACT)
        with Locations((31.0001404, -13.549999981)):
            Circle(SKETCH2_3_R)
        with Locations((31.0001404, -13.549999981)):
            Circle(SKETCH2_3_R_2, mode=Mode.SUBTRACT)
    extrude(amount=-CUT_EXTRUDE1_DEPTH, mode=Mode.SUBTRACT)

    # Sketch7 → Boss-Extrude4 (add)
    with BuildSketch(Plane(origin=(0, 0, 0), x_dir=(-1, 0, 0), z_dir=(0, 0, -1))):
        with Locations((-0.544699659, 6.810618968)):
            Rectangle(SKETCH7_W, SKETCH7_H)
        with Locations((-0.155628474, -10.184996596)):
            Rectangle(SKETCH7_W_2, SKETCH7_H_2)
    extrude(amount=-BOSS_EXTRUDE4_DEPTH)

    # Sketch8 → Cut-Extrude3 (cut)
    with BuildSketch(Plane.XY.offset(7)):
        with Locations((2.969066959, -15.806583642)):
            Rectangle(SKETCH8_W, SKETCH8_H)
    extrude(amount=-CUT_EXTRUDE3_DEPTH, mode=Mode.SUBTRACT)

    # Fillet3
    fillet3_edges = [part.edges().sort_by_distance(p)[0] for p in [
        (-37.5, 10.5, 3.5),
        (37.5, 10.5, 3.5),
        (37.5, -10.5, 3.5),
        (-37.5, -10.5, 3.5),
        (37.5, -1.244000007, 20.099999962),
        (-37.5, -1.244000007, 20.099999962),
    ]]
    fillet(fillet3_edges, radius=FILLET3_R)

    # Sketch4 → Cut-Extrude2 (cut)
    with BuildSketch(Plane.XY.offset(7)):
        with Locations((0, -12.270418149)):
            Rectangle(SKETCH4_W, SKETCH4_H)
    extrude(amount=-CUT_EXTRUDE2_DEPTH, mode=Mode.SUBTRACT)


solid = part.part
